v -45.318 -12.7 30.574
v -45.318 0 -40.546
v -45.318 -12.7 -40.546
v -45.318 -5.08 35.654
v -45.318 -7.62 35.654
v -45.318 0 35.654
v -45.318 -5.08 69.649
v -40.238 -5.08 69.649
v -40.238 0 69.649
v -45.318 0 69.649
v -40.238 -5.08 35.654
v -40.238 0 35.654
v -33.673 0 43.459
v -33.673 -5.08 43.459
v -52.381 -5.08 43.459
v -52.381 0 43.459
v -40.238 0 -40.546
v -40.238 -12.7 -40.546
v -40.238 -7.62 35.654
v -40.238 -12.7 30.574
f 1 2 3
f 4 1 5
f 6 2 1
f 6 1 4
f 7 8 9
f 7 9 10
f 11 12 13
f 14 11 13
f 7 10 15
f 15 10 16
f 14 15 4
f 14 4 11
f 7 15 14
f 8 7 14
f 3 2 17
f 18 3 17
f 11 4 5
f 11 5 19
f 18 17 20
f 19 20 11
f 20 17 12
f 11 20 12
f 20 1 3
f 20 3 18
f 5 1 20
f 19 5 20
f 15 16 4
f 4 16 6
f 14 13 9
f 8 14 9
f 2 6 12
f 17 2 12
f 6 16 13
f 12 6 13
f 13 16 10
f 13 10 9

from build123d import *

# Parameters (mm, degrees)
F0_W     = 5.08
F0_H     = 76.2
F1_DEPTH = 12.7
F2_DEPTH = 5.08
F3_SIZE  = 5.08


with BuildPart() as f1:
    # F0 (on Front) → F1 (new body)
    with BuildSketch(Plane.XZ):
        with Locations((-42.778187, -2.446348)):
            Rectangle(F0_W, F0_H)
    extrude(amount=F1_DEPTH)

    # F0 (on Front) → F2 (join)
    with BuildSketch(Plane.XZ):
        with Locations((-42.778187, -2.446348)):
            Rectangle(F0_W, F0_H)
        Polygon((-52.380648, 43.458667), (-45.318187, 35.653652), (-40.238187, 35.653652), (-33.673275, 43.458667), (-40.238187, 69.648996), (-45.318187, 69.648996), align=None)
    extrude(amount=F2_DEPTH)

    # F3
    f3_edges = [f1.edges().sort_by_distance(p)[0] for p in [
        (-42.778187, -12.7, 35.653652),
    ]]
    chamfer(f3_edges, length=F3_SIZE)


solid = f1.part
